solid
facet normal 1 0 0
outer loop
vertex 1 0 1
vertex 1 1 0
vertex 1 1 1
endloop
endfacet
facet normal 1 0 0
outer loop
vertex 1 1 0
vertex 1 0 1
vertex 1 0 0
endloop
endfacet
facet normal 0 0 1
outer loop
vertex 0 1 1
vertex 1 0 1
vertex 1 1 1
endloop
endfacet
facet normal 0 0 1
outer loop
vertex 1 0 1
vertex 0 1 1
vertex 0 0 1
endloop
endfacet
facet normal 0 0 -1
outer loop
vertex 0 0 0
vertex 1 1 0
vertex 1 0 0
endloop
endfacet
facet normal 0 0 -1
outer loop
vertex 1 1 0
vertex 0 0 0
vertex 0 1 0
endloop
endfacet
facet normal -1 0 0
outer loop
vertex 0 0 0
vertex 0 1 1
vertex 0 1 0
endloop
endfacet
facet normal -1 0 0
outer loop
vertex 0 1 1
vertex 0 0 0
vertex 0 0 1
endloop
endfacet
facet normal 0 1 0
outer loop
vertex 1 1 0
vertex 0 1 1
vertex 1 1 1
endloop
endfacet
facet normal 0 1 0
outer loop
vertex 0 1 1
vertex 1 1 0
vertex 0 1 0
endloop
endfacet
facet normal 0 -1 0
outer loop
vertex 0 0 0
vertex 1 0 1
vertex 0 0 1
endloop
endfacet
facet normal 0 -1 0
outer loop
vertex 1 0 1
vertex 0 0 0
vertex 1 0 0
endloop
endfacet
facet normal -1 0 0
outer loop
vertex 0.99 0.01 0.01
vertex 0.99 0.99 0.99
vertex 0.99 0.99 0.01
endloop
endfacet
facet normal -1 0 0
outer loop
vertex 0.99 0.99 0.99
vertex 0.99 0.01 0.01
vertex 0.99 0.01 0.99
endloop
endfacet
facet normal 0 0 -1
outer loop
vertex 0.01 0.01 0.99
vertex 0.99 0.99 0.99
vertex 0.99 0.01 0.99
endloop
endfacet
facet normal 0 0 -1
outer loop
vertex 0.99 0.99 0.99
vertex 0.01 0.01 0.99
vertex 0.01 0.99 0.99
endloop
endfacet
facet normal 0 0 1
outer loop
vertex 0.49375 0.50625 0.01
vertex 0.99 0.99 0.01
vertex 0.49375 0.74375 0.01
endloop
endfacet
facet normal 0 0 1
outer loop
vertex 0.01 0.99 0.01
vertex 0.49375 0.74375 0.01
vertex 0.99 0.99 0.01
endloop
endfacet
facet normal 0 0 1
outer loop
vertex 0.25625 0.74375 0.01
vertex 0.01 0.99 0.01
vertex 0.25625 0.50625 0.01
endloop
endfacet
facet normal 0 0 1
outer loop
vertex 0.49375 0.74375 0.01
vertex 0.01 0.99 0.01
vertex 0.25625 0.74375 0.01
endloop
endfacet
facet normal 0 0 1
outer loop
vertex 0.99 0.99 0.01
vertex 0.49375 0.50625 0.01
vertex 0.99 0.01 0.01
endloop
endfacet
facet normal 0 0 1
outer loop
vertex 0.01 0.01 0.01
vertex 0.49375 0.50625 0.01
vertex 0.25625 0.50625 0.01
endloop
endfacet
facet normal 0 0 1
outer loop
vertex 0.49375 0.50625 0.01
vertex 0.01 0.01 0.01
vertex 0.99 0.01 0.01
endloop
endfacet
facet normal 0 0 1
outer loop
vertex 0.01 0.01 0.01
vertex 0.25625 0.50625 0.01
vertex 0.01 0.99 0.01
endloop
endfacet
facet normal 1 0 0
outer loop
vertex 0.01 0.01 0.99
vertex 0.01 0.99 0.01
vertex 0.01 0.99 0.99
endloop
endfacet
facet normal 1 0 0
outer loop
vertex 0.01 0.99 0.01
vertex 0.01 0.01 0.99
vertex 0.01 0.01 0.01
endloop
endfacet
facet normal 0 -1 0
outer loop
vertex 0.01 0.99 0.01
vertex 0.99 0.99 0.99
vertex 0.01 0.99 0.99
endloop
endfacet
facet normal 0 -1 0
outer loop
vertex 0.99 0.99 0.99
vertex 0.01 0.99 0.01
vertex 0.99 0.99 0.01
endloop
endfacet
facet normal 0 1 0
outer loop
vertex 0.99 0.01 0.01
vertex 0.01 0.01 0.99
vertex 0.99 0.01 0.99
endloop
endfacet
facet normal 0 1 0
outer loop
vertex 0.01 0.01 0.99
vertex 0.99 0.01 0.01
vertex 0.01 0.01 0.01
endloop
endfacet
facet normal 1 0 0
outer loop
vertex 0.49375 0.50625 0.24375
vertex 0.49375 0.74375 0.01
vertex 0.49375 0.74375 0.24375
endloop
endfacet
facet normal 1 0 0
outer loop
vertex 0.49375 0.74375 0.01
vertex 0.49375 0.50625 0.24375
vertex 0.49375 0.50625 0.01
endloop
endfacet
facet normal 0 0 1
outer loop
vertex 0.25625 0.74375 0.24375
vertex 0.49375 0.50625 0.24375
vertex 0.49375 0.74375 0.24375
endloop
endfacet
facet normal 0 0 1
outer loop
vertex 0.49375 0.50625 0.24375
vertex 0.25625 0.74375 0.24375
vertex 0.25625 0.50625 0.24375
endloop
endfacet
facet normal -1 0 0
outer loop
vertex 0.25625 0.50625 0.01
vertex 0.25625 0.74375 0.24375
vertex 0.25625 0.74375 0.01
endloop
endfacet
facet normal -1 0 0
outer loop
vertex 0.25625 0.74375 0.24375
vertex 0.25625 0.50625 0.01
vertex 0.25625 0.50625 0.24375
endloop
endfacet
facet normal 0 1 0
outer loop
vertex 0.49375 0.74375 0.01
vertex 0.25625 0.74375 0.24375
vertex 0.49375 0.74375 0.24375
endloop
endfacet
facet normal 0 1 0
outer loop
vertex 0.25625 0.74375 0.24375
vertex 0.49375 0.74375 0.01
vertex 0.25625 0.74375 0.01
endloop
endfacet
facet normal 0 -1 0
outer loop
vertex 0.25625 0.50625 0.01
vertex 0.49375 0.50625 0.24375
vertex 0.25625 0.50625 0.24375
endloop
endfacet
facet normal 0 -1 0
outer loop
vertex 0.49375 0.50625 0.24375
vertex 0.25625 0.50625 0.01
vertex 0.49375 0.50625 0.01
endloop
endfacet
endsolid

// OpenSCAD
translate([0.375, 0.625, 0.125]) color([0.44662950243921207, 0.6272112083314144, 0.04251959027778274]) cube([0.2375, 0.2375, 0.2375], center=true);
color([0.3,0.3,0.3,0.3]) difference() { cube([1,1,1]); translate([0.01,0.01,0.01]) cube([0.98,0.98,0.98]); }
